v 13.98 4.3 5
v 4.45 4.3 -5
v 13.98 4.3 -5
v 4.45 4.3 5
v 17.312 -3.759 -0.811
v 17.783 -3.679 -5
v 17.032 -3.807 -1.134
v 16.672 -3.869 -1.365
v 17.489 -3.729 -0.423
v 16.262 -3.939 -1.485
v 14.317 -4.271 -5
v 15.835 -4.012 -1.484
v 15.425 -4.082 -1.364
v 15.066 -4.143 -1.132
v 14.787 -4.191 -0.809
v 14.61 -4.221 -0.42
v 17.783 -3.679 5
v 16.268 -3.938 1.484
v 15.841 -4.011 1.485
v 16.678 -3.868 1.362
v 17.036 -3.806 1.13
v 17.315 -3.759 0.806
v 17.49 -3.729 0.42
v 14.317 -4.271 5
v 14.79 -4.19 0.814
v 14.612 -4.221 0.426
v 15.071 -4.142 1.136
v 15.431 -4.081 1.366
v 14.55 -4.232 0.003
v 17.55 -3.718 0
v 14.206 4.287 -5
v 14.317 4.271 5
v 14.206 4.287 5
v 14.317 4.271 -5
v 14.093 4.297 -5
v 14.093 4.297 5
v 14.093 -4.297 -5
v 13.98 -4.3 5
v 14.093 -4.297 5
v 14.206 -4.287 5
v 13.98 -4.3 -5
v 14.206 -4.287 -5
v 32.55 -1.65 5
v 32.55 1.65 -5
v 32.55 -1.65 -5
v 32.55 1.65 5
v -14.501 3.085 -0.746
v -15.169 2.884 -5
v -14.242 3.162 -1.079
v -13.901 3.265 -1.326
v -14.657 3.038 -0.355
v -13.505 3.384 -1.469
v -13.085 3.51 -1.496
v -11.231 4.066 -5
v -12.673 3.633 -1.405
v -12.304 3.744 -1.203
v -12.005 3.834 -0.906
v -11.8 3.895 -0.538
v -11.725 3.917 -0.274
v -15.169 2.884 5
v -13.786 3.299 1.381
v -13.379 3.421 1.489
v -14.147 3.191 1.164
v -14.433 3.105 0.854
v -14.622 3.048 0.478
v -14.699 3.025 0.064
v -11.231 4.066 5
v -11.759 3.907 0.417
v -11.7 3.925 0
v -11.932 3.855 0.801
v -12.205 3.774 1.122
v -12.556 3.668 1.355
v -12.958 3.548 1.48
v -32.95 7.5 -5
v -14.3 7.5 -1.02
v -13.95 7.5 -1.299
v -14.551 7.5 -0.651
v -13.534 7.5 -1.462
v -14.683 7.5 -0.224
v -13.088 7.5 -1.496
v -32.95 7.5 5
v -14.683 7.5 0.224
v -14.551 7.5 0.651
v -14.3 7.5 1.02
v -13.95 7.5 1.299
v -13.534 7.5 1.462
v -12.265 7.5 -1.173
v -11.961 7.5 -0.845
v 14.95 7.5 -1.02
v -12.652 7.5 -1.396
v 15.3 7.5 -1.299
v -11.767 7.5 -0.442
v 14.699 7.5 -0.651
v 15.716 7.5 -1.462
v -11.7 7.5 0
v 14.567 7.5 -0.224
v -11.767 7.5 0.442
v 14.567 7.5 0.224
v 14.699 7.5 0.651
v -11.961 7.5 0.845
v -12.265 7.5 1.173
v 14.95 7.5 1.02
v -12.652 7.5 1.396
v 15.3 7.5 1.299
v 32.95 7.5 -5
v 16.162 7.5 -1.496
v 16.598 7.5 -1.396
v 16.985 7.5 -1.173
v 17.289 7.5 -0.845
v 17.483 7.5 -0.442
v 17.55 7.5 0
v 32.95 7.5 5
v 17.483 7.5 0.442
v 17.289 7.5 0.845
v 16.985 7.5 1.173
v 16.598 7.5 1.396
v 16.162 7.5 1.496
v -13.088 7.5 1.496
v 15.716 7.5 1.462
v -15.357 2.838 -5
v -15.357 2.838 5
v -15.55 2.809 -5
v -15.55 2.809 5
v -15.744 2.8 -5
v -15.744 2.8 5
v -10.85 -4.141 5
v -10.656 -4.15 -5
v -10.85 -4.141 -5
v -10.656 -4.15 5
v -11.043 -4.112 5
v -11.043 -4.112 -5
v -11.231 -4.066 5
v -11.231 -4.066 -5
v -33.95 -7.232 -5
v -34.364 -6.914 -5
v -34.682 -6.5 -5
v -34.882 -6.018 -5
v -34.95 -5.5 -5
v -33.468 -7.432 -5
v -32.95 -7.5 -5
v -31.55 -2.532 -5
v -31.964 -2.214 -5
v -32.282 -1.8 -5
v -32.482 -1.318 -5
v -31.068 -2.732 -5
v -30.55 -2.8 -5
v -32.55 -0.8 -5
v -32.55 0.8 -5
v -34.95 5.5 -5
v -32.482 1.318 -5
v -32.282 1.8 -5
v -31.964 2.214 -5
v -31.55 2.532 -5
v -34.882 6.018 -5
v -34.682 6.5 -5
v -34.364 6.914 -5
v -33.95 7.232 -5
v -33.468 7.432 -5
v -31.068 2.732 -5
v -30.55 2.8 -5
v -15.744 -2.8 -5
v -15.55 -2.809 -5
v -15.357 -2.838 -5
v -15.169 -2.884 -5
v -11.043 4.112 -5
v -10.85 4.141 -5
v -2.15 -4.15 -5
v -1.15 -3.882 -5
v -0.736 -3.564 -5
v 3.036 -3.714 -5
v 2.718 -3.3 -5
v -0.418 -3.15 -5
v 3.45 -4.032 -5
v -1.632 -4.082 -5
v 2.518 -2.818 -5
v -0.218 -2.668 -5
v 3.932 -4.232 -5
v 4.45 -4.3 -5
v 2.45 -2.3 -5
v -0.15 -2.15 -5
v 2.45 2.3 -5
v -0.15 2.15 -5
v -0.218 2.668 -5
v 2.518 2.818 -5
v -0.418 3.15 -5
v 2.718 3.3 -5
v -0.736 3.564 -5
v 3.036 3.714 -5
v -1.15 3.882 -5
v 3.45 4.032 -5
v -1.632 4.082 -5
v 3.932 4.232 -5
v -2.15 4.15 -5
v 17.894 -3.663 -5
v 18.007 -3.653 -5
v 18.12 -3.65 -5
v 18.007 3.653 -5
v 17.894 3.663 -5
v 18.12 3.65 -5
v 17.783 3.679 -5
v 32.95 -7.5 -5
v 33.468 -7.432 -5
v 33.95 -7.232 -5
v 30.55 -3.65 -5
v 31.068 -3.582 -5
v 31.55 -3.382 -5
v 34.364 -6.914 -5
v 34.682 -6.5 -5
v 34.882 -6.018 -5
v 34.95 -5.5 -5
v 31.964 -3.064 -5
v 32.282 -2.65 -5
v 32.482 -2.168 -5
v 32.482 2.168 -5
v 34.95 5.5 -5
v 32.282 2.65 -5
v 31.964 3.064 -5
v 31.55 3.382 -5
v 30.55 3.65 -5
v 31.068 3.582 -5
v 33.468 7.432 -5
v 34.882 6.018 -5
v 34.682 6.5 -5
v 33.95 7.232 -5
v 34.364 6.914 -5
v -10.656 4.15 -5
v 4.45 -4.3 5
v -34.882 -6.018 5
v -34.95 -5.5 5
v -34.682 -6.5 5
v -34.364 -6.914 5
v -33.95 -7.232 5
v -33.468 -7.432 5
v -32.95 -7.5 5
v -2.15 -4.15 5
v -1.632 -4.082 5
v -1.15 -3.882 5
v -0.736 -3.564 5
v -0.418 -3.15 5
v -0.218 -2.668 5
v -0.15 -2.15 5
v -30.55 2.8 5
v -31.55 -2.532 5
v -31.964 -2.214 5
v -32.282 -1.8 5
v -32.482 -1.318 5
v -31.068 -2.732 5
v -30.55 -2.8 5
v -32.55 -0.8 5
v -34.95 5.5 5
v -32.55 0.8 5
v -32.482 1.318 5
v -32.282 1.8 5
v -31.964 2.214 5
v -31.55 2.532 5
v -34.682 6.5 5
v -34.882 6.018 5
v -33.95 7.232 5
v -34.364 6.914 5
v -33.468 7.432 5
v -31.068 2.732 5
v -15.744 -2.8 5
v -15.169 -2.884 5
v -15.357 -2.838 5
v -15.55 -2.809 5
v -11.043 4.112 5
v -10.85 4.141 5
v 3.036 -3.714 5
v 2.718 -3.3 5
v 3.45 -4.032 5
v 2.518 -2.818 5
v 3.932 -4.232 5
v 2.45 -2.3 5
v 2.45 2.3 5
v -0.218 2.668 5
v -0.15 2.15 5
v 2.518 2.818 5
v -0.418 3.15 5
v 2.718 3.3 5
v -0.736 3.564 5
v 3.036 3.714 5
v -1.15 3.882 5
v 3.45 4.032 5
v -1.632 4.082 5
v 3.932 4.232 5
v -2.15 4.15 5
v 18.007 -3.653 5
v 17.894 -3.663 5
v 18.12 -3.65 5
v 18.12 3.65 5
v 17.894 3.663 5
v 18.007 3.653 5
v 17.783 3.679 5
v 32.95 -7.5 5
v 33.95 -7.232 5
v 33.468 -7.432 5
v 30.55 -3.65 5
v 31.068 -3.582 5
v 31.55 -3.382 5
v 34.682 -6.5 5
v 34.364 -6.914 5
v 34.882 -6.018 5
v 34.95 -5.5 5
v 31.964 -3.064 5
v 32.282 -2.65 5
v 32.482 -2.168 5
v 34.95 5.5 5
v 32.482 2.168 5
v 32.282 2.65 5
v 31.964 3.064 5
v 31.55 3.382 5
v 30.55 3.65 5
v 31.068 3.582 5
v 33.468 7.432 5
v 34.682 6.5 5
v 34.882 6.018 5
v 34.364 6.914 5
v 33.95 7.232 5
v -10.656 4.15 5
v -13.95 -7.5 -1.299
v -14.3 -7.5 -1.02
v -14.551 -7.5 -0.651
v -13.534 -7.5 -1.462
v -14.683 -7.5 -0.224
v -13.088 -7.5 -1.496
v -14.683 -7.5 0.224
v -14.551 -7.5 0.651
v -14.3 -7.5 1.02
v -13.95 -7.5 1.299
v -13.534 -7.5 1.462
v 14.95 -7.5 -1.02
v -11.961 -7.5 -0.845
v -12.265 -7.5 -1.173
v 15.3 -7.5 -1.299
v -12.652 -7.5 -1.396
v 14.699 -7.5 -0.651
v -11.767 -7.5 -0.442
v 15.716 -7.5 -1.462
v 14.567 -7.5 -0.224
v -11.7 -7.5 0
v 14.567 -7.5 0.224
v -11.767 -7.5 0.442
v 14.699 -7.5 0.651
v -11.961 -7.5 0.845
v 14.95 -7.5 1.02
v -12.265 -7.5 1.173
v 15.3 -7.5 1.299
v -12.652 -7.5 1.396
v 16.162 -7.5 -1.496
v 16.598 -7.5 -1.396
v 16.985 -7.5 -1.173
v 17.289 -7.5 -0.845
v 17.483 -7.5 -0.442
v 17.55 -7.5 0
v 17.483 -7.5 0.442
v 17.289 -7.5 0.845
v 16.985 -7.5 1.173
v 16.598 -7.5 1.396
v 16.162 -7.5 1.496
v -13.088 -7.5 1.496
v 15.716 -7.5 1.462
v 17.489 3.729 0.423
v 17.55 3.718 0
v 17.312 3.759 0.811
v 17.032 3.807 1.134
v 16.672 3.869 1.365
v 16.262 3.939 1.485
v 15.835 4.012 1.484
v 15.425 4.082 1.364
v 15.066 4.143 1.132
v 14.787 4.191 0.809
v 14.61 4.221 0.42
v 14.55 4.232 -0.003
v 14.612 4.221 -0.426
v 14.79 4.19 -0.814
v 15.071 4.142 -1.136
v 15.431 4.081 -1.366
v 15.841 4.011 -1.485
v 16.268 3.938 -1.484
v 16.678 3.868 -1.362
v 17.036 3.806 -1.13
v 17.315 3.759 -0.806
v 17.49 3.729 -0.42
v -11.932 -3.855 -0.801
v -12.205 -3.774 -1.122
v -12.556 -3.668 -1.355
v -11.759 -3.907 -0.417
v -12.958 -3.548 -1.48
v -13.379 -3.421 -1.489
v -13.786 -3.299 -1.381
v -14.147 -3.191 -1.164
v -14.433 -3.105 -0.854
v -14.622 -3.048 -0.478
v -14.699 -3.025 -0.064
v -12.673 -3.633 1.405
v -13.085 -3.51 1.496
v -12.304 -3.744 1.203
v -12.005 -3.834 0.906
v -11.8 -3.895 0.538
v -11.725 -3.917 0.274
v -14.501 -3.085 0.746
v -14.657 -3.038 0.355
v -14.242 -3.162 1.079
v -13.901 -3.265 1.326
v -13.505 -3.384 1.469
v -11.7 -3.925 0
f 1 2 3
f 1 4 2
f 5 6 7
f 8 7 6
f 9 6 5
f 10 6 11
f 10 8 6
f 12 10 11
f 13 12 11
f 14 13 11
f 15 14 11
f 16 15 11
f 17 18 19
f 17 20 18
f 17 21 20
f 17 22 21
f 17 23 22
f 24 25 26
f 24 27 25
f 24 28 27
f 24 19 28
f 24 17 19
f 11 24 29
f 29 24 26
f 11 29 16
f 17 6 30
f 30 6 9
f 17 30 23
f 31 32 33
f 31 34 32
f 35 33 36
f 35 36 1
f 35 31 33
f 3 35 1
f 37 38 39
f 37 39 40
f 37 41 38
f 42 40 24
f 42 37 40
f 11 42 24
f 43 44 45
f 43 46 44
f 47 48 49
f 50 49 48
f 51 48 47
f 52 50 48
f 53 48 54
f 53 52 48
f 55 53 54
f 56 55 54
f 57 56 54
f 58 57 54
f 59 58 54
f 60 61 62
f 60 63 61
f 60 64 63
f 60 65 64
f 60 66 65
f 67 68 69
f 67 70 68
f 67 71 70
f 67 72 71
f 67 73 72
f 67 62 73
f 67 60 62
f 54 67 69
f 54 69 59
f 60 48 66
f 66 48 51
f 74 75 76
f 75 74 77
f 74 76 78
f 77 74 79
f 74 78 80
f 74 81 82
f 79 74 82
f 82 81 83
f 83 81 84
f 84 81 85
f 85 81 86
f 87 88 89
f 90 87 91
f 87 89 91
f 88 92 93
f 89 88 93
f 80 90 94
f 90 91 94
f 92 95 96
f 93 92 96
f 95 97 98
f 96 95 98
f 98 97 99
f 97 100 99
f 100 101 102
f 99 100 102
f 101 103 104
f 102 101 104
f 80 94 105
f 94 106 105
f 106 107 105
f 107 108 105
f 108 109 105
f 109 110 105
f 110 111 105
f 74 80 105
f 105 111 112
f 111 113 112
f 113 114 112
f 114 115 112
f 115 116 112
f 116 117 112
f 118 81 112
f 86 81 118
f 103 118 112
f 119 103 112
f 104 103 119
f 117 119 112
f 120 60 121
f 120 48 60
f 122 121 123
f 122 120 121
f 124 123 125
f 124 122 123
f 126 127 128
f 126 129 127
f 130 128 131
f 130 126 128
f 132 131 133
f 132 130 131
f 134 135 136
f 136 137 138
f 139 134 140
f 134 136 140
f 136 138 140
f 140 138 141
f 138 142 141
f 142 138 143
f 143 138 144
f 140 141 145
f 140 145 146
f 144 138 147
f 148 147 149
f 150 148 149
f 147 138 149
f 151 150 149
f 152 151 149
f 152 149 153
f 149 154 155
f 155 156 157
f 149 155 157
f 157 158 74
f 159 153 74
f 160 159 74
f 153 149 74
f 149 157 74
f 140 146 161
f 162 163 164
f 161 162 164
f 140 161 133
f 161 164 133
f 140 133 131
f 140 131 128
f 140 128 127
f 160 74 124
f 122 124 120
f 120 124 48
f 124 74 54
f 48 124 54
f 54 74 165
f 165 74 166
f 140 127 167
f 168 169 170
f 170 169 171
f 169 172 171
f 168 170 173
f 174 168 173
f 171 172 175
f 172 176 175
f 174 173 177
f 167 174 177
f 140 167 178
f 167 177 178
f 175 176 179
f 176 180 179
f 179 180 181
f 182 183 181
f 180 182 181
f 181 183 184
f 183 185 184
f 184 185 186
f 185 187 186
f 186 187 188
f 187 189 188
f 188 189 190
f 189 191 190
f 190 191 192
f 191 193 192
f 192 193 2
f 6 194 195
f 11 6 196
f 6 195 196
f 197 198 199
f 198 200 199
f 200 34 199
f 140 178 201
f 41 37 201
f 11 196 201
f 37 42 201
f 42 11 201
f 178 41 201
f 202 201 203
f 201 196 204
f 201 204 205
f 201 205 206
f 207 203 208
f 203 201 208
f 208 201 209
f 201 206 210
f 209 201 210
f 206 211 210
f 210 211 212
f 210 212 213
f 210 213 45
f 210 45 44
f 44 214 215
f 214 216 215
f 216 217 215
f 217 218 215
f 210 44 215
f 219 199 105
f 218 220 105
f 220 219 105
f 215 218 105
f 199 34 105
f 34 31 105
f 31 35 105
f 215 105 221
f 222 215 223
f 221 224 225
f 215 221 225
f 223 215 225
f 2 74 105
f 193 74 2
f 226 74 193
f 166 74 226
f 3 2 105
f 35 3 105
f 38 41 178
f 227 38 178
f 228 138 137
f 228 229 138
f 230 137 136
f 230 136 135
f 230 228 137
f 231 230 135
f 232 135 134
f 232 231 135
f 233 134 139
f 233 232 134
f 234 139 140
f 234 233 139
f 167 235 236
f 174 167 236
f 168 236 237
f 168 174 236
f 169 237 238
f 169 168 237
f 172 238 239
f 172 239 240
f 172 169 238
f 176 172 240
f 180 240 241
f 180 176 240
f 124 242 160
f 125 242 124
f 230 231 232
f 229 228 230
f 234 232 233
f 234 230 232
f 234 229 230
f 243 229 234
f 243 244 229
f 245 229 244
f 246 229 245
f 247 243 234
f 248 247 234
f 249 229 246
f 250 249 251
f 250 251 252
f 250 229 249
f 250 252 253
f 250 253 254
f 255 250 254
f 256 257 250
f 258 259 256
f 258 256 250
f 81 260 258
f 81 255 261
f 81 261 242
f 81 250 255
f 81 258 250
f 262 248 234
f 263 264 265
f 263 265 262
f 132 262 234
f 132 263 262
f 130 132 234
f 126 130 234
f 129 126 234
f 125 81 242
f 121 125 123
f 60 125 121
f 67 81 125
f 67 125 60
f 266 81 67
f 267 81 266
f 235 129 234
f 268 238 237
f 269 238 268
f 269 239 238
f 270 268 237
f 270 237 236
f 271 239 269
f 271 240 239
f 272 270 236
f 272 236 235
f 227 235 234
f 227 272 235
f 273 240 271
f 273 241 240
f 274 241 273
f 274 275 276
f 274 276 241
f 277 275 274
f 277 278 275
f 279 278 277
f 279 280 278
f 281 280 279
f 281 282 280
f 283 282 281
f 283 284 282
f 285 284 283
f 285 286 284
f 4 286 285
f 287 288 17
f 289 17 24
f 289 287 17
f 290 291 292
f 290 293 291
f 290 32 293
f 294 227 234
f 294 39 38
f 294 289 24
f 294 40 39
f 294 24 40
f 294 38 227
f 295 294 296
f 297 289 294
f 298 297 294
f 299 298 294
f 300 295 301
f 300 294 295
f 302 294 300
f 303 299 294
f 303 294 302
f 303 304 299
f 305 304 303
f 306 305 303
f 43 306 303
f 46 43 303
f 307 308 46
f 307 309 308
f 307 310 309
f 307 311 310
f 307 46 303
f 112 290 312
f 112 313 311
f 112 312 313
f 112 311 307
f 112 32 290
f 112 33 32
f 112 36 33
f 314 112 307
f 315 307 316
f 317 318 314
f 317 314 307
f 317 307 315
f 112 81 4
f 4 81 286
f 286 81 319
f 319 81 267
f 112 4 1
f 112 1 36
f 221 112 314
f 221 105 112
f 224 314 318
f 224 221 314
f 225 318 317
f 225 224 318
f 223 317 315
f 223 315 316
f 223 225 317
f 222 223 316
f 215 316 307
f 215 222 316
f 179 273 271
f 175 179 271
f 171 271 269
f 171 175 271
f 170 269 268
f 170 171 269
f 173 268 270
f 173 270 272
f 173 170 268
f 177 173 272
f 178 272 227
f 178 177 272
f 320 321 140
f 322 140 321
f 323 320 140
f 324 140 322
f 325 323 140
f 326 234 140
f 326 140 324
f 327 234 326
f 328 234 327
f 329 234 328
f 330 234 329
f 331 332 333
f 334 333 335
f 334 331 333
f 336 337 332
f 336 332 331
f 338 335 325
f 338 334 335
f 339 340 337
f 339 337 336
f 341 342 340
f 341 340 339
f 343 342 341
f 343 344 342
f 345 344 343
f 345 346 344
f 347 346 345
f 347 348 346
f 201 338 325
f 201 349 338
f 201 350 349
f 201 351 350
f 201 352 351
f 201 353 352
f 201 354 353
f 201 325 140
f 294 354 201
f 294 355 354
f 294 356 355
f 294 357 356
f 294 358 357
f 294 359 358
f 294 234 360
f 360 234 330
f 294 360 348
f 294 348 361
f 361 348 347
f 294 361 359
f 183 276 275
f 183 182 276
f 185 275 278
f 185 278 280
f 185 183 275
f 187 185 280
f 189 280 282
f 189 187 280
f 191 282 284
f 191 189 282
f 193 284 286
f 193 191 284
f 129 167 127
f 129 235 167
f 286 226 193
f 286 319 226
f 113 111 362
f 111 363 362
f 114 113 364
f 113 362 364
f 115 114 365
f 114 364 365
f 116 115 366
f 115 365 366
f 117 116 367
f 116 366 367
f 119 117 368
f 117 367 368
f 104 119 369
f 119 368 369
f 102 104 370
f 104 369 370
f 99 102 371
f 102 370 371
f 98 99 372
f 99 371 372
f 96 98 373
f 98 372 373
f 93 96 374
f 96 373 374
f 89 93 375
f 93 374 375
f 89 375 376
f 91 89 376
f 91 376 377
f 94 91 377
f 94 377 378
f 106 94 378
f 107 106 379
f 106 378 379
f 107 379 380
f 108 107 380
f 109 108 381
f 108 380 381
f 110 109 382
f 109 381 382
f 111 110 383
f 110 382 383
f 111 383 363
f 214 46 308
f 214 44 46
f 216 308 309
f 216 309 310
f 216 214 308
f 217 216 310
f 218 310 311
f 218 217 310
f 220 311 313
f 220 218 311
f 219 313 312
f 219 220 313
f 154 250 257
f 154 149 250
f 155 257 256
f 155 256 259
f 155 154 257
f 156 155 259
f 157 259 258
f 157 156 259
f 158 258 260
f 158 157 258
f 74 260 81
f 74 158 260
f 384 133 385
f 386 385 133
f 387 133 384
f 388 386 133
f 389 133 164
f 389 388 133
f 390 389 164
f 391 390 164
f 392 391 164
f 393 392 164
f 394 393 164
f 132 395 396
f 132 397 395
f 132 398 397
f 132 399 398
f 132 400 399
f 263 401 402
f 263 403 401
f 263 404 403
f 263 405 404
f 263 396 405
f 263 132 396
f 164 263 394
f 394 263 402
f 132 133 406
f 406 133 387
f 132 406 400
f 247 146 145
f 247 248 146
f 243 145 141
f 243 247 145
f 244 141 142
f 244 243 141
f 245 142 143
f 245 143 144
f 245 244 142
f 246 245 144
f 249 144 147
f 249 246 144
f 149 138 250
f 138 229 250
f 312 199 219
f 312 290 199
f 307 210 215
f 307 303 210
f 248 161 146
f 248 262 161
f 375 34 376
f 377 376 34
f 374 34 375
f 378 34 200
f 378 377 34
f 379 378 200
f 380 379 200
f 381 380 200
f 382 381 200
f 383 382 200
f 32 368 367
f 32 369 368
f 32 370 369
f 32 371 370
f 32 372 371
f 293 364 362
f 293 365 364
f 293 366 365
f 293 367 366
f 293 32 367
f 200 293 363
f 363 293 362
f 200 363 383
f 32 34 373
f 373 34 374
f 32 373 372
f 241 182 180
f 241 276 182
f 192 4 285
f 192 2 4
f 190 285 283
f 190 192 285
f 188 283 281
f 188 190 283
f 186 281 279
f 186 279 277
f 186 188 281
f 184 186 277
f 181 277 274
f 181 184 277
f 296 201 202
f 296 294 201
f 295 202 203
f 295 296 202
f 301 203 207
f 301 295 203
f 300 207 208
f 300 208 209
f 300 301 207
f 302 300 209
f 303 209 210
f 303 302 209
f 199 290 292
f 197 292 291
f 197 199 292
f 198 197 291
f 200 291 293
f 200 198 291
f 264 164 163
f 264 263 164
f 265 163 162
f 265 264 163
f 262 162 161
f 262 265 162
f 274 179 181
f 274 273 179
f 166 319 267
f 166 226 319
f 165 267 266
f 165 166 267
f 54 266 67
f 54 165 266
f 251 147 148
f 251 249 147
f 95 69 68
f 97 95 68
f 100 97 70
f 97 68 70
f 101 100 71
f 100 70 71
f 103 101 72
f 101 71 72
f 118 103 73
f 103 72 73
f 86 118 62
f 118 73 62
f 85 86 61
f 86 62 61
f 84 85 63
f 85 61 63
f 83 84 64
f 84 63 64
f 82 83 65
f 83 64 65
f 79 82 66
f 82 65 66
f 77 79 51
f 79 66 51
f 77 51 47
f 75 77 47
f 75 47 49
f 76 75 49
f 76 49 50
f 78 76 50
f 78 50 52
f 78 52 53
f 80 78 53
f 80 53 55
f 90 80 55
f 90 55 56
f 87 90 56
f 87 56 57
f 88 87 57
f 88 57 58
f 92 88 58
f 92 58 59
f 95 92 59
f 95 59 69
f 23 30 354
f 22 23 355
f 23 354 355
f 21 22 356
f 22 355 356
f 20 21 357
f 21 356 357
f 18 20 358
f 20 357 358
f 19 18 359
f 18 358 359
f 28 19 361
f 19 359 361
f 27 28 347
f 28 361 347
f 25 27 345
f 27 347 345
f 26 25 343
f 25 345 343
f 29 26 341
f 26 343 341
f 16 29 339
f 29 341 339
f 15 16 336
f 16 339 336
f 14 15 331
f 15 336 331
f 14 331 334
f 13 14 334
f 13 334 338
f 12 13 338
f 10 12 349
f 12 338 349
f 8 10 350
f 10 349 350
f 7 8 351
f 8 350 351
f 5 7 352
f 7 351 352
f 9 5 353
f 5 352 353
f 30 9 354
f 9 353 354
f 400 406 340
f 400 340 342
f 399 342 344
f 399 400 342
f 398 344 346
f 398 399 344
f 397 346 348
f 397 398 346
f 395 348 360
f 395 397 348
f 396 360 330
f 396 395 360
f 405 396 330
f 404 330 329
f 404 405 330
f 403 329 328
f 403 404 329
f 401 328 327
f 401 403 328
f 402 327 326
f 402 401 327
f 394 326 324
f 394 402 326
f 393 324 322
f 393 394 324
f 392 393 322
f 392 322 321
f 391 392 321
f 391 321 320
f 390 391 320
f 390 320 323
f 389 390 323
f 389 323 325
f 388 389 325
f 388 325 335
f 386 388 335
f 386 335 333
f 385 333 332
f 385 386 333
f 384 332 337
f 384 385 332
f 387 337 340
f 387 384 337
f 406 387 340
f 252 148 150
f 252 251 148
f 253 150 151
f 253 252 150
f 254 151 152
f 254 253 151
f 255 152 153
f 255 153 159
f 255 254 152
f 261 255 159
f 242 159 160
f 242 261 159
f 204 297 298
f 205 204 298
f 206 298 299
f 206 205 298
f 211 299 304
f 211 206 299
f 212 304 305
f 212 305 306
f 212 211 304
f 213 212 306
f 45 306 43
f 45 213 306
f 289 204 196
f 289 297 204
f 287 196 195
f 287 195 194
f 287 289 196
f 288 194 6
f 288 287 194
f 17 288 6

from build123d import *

# Parameters (mm, degrees)
F0_W     = 69.9
F0_H     = 15
F1_DEPTH = 5
F2_R     = 1.5
F3_DEPTH = 12.5
F4_R     = 2
F5_R     = 2


with BuildPart() as f1:
    # F0 (on Top) → F1 (new body, symmetric)
    with BuildSketch(Plane.XY):
        Rectangle(F0_W, F0_H)
        Polygon((-10.95, -4.15), (-15.45, -2.8), (-32.55, -2.8), (-32.55, 2.8), (-15.45, 2.8), (-10.95, 4.15), (-0.15, 4.15), (-0.15, -4.15), align=None, mode=Mode.SUBTRACT)
        Polygon((17.95, -3.65), (14.15, -4.3), (2.45, -4.3), (2.45, 4.3), (14.15, 4.3), (17.95, 3.65), (32.55, 3.65), (32.55, -3.65), align=None, mode=Mode.SUBTRACT)
    extrude(amount=F1_DEPTH, both=True)

    # F2 (on Front) → F3 (cut, symmetric)
    with BuildSketch(Plane.XZ):
        with Locations((-13.2, 0)):
            Circle(F2_R)
        with Locations((16.05, 0)):
            Circle(F2_R)
    extrude(amount=F3_DEPTH, both=True, mode=Mode.SUBTRACT)

    # F4
    f4_edges = [f1.edges().sort_by_distance(p)[0] for p in [
        (-34.95, 7.5, 0),
        (-34.95, -7.5, 0),
        (34.95, -7.5, 0),
        (34.95, 7.5, 0),
    ]]
    fillet(f4_edges, radius=F4_R)

    # F5
    f5_edges = [f1.edges().sort_by_distance(p)[0] for p in [
        (-32.55, 2.8, 0),
        (32.55, 3.65, 0),
        (32.55, -3.65, 0),
        (-32.55, -2.8, 0),
        (-15.45, 2.8, 0),
        (-10.95, 4.15, 0),
        (14.15, 4.3, 0),
        (17.95, 3.65, 0),
        (-15.45, -2.8, 0),
        (-10.95, -4.15, 0),
        (14.15, -4.3, 0),
        (17.95, -3.65, 0),
        (-0.15, 4.15, 0),
        (-0.15, -4.15, 0),
        (2.45, -4.3, 0),
        (2.45, 4.3, 0),
    ]]
    fillet(f5_edges, radius=F5_R)


solid = f1.part
